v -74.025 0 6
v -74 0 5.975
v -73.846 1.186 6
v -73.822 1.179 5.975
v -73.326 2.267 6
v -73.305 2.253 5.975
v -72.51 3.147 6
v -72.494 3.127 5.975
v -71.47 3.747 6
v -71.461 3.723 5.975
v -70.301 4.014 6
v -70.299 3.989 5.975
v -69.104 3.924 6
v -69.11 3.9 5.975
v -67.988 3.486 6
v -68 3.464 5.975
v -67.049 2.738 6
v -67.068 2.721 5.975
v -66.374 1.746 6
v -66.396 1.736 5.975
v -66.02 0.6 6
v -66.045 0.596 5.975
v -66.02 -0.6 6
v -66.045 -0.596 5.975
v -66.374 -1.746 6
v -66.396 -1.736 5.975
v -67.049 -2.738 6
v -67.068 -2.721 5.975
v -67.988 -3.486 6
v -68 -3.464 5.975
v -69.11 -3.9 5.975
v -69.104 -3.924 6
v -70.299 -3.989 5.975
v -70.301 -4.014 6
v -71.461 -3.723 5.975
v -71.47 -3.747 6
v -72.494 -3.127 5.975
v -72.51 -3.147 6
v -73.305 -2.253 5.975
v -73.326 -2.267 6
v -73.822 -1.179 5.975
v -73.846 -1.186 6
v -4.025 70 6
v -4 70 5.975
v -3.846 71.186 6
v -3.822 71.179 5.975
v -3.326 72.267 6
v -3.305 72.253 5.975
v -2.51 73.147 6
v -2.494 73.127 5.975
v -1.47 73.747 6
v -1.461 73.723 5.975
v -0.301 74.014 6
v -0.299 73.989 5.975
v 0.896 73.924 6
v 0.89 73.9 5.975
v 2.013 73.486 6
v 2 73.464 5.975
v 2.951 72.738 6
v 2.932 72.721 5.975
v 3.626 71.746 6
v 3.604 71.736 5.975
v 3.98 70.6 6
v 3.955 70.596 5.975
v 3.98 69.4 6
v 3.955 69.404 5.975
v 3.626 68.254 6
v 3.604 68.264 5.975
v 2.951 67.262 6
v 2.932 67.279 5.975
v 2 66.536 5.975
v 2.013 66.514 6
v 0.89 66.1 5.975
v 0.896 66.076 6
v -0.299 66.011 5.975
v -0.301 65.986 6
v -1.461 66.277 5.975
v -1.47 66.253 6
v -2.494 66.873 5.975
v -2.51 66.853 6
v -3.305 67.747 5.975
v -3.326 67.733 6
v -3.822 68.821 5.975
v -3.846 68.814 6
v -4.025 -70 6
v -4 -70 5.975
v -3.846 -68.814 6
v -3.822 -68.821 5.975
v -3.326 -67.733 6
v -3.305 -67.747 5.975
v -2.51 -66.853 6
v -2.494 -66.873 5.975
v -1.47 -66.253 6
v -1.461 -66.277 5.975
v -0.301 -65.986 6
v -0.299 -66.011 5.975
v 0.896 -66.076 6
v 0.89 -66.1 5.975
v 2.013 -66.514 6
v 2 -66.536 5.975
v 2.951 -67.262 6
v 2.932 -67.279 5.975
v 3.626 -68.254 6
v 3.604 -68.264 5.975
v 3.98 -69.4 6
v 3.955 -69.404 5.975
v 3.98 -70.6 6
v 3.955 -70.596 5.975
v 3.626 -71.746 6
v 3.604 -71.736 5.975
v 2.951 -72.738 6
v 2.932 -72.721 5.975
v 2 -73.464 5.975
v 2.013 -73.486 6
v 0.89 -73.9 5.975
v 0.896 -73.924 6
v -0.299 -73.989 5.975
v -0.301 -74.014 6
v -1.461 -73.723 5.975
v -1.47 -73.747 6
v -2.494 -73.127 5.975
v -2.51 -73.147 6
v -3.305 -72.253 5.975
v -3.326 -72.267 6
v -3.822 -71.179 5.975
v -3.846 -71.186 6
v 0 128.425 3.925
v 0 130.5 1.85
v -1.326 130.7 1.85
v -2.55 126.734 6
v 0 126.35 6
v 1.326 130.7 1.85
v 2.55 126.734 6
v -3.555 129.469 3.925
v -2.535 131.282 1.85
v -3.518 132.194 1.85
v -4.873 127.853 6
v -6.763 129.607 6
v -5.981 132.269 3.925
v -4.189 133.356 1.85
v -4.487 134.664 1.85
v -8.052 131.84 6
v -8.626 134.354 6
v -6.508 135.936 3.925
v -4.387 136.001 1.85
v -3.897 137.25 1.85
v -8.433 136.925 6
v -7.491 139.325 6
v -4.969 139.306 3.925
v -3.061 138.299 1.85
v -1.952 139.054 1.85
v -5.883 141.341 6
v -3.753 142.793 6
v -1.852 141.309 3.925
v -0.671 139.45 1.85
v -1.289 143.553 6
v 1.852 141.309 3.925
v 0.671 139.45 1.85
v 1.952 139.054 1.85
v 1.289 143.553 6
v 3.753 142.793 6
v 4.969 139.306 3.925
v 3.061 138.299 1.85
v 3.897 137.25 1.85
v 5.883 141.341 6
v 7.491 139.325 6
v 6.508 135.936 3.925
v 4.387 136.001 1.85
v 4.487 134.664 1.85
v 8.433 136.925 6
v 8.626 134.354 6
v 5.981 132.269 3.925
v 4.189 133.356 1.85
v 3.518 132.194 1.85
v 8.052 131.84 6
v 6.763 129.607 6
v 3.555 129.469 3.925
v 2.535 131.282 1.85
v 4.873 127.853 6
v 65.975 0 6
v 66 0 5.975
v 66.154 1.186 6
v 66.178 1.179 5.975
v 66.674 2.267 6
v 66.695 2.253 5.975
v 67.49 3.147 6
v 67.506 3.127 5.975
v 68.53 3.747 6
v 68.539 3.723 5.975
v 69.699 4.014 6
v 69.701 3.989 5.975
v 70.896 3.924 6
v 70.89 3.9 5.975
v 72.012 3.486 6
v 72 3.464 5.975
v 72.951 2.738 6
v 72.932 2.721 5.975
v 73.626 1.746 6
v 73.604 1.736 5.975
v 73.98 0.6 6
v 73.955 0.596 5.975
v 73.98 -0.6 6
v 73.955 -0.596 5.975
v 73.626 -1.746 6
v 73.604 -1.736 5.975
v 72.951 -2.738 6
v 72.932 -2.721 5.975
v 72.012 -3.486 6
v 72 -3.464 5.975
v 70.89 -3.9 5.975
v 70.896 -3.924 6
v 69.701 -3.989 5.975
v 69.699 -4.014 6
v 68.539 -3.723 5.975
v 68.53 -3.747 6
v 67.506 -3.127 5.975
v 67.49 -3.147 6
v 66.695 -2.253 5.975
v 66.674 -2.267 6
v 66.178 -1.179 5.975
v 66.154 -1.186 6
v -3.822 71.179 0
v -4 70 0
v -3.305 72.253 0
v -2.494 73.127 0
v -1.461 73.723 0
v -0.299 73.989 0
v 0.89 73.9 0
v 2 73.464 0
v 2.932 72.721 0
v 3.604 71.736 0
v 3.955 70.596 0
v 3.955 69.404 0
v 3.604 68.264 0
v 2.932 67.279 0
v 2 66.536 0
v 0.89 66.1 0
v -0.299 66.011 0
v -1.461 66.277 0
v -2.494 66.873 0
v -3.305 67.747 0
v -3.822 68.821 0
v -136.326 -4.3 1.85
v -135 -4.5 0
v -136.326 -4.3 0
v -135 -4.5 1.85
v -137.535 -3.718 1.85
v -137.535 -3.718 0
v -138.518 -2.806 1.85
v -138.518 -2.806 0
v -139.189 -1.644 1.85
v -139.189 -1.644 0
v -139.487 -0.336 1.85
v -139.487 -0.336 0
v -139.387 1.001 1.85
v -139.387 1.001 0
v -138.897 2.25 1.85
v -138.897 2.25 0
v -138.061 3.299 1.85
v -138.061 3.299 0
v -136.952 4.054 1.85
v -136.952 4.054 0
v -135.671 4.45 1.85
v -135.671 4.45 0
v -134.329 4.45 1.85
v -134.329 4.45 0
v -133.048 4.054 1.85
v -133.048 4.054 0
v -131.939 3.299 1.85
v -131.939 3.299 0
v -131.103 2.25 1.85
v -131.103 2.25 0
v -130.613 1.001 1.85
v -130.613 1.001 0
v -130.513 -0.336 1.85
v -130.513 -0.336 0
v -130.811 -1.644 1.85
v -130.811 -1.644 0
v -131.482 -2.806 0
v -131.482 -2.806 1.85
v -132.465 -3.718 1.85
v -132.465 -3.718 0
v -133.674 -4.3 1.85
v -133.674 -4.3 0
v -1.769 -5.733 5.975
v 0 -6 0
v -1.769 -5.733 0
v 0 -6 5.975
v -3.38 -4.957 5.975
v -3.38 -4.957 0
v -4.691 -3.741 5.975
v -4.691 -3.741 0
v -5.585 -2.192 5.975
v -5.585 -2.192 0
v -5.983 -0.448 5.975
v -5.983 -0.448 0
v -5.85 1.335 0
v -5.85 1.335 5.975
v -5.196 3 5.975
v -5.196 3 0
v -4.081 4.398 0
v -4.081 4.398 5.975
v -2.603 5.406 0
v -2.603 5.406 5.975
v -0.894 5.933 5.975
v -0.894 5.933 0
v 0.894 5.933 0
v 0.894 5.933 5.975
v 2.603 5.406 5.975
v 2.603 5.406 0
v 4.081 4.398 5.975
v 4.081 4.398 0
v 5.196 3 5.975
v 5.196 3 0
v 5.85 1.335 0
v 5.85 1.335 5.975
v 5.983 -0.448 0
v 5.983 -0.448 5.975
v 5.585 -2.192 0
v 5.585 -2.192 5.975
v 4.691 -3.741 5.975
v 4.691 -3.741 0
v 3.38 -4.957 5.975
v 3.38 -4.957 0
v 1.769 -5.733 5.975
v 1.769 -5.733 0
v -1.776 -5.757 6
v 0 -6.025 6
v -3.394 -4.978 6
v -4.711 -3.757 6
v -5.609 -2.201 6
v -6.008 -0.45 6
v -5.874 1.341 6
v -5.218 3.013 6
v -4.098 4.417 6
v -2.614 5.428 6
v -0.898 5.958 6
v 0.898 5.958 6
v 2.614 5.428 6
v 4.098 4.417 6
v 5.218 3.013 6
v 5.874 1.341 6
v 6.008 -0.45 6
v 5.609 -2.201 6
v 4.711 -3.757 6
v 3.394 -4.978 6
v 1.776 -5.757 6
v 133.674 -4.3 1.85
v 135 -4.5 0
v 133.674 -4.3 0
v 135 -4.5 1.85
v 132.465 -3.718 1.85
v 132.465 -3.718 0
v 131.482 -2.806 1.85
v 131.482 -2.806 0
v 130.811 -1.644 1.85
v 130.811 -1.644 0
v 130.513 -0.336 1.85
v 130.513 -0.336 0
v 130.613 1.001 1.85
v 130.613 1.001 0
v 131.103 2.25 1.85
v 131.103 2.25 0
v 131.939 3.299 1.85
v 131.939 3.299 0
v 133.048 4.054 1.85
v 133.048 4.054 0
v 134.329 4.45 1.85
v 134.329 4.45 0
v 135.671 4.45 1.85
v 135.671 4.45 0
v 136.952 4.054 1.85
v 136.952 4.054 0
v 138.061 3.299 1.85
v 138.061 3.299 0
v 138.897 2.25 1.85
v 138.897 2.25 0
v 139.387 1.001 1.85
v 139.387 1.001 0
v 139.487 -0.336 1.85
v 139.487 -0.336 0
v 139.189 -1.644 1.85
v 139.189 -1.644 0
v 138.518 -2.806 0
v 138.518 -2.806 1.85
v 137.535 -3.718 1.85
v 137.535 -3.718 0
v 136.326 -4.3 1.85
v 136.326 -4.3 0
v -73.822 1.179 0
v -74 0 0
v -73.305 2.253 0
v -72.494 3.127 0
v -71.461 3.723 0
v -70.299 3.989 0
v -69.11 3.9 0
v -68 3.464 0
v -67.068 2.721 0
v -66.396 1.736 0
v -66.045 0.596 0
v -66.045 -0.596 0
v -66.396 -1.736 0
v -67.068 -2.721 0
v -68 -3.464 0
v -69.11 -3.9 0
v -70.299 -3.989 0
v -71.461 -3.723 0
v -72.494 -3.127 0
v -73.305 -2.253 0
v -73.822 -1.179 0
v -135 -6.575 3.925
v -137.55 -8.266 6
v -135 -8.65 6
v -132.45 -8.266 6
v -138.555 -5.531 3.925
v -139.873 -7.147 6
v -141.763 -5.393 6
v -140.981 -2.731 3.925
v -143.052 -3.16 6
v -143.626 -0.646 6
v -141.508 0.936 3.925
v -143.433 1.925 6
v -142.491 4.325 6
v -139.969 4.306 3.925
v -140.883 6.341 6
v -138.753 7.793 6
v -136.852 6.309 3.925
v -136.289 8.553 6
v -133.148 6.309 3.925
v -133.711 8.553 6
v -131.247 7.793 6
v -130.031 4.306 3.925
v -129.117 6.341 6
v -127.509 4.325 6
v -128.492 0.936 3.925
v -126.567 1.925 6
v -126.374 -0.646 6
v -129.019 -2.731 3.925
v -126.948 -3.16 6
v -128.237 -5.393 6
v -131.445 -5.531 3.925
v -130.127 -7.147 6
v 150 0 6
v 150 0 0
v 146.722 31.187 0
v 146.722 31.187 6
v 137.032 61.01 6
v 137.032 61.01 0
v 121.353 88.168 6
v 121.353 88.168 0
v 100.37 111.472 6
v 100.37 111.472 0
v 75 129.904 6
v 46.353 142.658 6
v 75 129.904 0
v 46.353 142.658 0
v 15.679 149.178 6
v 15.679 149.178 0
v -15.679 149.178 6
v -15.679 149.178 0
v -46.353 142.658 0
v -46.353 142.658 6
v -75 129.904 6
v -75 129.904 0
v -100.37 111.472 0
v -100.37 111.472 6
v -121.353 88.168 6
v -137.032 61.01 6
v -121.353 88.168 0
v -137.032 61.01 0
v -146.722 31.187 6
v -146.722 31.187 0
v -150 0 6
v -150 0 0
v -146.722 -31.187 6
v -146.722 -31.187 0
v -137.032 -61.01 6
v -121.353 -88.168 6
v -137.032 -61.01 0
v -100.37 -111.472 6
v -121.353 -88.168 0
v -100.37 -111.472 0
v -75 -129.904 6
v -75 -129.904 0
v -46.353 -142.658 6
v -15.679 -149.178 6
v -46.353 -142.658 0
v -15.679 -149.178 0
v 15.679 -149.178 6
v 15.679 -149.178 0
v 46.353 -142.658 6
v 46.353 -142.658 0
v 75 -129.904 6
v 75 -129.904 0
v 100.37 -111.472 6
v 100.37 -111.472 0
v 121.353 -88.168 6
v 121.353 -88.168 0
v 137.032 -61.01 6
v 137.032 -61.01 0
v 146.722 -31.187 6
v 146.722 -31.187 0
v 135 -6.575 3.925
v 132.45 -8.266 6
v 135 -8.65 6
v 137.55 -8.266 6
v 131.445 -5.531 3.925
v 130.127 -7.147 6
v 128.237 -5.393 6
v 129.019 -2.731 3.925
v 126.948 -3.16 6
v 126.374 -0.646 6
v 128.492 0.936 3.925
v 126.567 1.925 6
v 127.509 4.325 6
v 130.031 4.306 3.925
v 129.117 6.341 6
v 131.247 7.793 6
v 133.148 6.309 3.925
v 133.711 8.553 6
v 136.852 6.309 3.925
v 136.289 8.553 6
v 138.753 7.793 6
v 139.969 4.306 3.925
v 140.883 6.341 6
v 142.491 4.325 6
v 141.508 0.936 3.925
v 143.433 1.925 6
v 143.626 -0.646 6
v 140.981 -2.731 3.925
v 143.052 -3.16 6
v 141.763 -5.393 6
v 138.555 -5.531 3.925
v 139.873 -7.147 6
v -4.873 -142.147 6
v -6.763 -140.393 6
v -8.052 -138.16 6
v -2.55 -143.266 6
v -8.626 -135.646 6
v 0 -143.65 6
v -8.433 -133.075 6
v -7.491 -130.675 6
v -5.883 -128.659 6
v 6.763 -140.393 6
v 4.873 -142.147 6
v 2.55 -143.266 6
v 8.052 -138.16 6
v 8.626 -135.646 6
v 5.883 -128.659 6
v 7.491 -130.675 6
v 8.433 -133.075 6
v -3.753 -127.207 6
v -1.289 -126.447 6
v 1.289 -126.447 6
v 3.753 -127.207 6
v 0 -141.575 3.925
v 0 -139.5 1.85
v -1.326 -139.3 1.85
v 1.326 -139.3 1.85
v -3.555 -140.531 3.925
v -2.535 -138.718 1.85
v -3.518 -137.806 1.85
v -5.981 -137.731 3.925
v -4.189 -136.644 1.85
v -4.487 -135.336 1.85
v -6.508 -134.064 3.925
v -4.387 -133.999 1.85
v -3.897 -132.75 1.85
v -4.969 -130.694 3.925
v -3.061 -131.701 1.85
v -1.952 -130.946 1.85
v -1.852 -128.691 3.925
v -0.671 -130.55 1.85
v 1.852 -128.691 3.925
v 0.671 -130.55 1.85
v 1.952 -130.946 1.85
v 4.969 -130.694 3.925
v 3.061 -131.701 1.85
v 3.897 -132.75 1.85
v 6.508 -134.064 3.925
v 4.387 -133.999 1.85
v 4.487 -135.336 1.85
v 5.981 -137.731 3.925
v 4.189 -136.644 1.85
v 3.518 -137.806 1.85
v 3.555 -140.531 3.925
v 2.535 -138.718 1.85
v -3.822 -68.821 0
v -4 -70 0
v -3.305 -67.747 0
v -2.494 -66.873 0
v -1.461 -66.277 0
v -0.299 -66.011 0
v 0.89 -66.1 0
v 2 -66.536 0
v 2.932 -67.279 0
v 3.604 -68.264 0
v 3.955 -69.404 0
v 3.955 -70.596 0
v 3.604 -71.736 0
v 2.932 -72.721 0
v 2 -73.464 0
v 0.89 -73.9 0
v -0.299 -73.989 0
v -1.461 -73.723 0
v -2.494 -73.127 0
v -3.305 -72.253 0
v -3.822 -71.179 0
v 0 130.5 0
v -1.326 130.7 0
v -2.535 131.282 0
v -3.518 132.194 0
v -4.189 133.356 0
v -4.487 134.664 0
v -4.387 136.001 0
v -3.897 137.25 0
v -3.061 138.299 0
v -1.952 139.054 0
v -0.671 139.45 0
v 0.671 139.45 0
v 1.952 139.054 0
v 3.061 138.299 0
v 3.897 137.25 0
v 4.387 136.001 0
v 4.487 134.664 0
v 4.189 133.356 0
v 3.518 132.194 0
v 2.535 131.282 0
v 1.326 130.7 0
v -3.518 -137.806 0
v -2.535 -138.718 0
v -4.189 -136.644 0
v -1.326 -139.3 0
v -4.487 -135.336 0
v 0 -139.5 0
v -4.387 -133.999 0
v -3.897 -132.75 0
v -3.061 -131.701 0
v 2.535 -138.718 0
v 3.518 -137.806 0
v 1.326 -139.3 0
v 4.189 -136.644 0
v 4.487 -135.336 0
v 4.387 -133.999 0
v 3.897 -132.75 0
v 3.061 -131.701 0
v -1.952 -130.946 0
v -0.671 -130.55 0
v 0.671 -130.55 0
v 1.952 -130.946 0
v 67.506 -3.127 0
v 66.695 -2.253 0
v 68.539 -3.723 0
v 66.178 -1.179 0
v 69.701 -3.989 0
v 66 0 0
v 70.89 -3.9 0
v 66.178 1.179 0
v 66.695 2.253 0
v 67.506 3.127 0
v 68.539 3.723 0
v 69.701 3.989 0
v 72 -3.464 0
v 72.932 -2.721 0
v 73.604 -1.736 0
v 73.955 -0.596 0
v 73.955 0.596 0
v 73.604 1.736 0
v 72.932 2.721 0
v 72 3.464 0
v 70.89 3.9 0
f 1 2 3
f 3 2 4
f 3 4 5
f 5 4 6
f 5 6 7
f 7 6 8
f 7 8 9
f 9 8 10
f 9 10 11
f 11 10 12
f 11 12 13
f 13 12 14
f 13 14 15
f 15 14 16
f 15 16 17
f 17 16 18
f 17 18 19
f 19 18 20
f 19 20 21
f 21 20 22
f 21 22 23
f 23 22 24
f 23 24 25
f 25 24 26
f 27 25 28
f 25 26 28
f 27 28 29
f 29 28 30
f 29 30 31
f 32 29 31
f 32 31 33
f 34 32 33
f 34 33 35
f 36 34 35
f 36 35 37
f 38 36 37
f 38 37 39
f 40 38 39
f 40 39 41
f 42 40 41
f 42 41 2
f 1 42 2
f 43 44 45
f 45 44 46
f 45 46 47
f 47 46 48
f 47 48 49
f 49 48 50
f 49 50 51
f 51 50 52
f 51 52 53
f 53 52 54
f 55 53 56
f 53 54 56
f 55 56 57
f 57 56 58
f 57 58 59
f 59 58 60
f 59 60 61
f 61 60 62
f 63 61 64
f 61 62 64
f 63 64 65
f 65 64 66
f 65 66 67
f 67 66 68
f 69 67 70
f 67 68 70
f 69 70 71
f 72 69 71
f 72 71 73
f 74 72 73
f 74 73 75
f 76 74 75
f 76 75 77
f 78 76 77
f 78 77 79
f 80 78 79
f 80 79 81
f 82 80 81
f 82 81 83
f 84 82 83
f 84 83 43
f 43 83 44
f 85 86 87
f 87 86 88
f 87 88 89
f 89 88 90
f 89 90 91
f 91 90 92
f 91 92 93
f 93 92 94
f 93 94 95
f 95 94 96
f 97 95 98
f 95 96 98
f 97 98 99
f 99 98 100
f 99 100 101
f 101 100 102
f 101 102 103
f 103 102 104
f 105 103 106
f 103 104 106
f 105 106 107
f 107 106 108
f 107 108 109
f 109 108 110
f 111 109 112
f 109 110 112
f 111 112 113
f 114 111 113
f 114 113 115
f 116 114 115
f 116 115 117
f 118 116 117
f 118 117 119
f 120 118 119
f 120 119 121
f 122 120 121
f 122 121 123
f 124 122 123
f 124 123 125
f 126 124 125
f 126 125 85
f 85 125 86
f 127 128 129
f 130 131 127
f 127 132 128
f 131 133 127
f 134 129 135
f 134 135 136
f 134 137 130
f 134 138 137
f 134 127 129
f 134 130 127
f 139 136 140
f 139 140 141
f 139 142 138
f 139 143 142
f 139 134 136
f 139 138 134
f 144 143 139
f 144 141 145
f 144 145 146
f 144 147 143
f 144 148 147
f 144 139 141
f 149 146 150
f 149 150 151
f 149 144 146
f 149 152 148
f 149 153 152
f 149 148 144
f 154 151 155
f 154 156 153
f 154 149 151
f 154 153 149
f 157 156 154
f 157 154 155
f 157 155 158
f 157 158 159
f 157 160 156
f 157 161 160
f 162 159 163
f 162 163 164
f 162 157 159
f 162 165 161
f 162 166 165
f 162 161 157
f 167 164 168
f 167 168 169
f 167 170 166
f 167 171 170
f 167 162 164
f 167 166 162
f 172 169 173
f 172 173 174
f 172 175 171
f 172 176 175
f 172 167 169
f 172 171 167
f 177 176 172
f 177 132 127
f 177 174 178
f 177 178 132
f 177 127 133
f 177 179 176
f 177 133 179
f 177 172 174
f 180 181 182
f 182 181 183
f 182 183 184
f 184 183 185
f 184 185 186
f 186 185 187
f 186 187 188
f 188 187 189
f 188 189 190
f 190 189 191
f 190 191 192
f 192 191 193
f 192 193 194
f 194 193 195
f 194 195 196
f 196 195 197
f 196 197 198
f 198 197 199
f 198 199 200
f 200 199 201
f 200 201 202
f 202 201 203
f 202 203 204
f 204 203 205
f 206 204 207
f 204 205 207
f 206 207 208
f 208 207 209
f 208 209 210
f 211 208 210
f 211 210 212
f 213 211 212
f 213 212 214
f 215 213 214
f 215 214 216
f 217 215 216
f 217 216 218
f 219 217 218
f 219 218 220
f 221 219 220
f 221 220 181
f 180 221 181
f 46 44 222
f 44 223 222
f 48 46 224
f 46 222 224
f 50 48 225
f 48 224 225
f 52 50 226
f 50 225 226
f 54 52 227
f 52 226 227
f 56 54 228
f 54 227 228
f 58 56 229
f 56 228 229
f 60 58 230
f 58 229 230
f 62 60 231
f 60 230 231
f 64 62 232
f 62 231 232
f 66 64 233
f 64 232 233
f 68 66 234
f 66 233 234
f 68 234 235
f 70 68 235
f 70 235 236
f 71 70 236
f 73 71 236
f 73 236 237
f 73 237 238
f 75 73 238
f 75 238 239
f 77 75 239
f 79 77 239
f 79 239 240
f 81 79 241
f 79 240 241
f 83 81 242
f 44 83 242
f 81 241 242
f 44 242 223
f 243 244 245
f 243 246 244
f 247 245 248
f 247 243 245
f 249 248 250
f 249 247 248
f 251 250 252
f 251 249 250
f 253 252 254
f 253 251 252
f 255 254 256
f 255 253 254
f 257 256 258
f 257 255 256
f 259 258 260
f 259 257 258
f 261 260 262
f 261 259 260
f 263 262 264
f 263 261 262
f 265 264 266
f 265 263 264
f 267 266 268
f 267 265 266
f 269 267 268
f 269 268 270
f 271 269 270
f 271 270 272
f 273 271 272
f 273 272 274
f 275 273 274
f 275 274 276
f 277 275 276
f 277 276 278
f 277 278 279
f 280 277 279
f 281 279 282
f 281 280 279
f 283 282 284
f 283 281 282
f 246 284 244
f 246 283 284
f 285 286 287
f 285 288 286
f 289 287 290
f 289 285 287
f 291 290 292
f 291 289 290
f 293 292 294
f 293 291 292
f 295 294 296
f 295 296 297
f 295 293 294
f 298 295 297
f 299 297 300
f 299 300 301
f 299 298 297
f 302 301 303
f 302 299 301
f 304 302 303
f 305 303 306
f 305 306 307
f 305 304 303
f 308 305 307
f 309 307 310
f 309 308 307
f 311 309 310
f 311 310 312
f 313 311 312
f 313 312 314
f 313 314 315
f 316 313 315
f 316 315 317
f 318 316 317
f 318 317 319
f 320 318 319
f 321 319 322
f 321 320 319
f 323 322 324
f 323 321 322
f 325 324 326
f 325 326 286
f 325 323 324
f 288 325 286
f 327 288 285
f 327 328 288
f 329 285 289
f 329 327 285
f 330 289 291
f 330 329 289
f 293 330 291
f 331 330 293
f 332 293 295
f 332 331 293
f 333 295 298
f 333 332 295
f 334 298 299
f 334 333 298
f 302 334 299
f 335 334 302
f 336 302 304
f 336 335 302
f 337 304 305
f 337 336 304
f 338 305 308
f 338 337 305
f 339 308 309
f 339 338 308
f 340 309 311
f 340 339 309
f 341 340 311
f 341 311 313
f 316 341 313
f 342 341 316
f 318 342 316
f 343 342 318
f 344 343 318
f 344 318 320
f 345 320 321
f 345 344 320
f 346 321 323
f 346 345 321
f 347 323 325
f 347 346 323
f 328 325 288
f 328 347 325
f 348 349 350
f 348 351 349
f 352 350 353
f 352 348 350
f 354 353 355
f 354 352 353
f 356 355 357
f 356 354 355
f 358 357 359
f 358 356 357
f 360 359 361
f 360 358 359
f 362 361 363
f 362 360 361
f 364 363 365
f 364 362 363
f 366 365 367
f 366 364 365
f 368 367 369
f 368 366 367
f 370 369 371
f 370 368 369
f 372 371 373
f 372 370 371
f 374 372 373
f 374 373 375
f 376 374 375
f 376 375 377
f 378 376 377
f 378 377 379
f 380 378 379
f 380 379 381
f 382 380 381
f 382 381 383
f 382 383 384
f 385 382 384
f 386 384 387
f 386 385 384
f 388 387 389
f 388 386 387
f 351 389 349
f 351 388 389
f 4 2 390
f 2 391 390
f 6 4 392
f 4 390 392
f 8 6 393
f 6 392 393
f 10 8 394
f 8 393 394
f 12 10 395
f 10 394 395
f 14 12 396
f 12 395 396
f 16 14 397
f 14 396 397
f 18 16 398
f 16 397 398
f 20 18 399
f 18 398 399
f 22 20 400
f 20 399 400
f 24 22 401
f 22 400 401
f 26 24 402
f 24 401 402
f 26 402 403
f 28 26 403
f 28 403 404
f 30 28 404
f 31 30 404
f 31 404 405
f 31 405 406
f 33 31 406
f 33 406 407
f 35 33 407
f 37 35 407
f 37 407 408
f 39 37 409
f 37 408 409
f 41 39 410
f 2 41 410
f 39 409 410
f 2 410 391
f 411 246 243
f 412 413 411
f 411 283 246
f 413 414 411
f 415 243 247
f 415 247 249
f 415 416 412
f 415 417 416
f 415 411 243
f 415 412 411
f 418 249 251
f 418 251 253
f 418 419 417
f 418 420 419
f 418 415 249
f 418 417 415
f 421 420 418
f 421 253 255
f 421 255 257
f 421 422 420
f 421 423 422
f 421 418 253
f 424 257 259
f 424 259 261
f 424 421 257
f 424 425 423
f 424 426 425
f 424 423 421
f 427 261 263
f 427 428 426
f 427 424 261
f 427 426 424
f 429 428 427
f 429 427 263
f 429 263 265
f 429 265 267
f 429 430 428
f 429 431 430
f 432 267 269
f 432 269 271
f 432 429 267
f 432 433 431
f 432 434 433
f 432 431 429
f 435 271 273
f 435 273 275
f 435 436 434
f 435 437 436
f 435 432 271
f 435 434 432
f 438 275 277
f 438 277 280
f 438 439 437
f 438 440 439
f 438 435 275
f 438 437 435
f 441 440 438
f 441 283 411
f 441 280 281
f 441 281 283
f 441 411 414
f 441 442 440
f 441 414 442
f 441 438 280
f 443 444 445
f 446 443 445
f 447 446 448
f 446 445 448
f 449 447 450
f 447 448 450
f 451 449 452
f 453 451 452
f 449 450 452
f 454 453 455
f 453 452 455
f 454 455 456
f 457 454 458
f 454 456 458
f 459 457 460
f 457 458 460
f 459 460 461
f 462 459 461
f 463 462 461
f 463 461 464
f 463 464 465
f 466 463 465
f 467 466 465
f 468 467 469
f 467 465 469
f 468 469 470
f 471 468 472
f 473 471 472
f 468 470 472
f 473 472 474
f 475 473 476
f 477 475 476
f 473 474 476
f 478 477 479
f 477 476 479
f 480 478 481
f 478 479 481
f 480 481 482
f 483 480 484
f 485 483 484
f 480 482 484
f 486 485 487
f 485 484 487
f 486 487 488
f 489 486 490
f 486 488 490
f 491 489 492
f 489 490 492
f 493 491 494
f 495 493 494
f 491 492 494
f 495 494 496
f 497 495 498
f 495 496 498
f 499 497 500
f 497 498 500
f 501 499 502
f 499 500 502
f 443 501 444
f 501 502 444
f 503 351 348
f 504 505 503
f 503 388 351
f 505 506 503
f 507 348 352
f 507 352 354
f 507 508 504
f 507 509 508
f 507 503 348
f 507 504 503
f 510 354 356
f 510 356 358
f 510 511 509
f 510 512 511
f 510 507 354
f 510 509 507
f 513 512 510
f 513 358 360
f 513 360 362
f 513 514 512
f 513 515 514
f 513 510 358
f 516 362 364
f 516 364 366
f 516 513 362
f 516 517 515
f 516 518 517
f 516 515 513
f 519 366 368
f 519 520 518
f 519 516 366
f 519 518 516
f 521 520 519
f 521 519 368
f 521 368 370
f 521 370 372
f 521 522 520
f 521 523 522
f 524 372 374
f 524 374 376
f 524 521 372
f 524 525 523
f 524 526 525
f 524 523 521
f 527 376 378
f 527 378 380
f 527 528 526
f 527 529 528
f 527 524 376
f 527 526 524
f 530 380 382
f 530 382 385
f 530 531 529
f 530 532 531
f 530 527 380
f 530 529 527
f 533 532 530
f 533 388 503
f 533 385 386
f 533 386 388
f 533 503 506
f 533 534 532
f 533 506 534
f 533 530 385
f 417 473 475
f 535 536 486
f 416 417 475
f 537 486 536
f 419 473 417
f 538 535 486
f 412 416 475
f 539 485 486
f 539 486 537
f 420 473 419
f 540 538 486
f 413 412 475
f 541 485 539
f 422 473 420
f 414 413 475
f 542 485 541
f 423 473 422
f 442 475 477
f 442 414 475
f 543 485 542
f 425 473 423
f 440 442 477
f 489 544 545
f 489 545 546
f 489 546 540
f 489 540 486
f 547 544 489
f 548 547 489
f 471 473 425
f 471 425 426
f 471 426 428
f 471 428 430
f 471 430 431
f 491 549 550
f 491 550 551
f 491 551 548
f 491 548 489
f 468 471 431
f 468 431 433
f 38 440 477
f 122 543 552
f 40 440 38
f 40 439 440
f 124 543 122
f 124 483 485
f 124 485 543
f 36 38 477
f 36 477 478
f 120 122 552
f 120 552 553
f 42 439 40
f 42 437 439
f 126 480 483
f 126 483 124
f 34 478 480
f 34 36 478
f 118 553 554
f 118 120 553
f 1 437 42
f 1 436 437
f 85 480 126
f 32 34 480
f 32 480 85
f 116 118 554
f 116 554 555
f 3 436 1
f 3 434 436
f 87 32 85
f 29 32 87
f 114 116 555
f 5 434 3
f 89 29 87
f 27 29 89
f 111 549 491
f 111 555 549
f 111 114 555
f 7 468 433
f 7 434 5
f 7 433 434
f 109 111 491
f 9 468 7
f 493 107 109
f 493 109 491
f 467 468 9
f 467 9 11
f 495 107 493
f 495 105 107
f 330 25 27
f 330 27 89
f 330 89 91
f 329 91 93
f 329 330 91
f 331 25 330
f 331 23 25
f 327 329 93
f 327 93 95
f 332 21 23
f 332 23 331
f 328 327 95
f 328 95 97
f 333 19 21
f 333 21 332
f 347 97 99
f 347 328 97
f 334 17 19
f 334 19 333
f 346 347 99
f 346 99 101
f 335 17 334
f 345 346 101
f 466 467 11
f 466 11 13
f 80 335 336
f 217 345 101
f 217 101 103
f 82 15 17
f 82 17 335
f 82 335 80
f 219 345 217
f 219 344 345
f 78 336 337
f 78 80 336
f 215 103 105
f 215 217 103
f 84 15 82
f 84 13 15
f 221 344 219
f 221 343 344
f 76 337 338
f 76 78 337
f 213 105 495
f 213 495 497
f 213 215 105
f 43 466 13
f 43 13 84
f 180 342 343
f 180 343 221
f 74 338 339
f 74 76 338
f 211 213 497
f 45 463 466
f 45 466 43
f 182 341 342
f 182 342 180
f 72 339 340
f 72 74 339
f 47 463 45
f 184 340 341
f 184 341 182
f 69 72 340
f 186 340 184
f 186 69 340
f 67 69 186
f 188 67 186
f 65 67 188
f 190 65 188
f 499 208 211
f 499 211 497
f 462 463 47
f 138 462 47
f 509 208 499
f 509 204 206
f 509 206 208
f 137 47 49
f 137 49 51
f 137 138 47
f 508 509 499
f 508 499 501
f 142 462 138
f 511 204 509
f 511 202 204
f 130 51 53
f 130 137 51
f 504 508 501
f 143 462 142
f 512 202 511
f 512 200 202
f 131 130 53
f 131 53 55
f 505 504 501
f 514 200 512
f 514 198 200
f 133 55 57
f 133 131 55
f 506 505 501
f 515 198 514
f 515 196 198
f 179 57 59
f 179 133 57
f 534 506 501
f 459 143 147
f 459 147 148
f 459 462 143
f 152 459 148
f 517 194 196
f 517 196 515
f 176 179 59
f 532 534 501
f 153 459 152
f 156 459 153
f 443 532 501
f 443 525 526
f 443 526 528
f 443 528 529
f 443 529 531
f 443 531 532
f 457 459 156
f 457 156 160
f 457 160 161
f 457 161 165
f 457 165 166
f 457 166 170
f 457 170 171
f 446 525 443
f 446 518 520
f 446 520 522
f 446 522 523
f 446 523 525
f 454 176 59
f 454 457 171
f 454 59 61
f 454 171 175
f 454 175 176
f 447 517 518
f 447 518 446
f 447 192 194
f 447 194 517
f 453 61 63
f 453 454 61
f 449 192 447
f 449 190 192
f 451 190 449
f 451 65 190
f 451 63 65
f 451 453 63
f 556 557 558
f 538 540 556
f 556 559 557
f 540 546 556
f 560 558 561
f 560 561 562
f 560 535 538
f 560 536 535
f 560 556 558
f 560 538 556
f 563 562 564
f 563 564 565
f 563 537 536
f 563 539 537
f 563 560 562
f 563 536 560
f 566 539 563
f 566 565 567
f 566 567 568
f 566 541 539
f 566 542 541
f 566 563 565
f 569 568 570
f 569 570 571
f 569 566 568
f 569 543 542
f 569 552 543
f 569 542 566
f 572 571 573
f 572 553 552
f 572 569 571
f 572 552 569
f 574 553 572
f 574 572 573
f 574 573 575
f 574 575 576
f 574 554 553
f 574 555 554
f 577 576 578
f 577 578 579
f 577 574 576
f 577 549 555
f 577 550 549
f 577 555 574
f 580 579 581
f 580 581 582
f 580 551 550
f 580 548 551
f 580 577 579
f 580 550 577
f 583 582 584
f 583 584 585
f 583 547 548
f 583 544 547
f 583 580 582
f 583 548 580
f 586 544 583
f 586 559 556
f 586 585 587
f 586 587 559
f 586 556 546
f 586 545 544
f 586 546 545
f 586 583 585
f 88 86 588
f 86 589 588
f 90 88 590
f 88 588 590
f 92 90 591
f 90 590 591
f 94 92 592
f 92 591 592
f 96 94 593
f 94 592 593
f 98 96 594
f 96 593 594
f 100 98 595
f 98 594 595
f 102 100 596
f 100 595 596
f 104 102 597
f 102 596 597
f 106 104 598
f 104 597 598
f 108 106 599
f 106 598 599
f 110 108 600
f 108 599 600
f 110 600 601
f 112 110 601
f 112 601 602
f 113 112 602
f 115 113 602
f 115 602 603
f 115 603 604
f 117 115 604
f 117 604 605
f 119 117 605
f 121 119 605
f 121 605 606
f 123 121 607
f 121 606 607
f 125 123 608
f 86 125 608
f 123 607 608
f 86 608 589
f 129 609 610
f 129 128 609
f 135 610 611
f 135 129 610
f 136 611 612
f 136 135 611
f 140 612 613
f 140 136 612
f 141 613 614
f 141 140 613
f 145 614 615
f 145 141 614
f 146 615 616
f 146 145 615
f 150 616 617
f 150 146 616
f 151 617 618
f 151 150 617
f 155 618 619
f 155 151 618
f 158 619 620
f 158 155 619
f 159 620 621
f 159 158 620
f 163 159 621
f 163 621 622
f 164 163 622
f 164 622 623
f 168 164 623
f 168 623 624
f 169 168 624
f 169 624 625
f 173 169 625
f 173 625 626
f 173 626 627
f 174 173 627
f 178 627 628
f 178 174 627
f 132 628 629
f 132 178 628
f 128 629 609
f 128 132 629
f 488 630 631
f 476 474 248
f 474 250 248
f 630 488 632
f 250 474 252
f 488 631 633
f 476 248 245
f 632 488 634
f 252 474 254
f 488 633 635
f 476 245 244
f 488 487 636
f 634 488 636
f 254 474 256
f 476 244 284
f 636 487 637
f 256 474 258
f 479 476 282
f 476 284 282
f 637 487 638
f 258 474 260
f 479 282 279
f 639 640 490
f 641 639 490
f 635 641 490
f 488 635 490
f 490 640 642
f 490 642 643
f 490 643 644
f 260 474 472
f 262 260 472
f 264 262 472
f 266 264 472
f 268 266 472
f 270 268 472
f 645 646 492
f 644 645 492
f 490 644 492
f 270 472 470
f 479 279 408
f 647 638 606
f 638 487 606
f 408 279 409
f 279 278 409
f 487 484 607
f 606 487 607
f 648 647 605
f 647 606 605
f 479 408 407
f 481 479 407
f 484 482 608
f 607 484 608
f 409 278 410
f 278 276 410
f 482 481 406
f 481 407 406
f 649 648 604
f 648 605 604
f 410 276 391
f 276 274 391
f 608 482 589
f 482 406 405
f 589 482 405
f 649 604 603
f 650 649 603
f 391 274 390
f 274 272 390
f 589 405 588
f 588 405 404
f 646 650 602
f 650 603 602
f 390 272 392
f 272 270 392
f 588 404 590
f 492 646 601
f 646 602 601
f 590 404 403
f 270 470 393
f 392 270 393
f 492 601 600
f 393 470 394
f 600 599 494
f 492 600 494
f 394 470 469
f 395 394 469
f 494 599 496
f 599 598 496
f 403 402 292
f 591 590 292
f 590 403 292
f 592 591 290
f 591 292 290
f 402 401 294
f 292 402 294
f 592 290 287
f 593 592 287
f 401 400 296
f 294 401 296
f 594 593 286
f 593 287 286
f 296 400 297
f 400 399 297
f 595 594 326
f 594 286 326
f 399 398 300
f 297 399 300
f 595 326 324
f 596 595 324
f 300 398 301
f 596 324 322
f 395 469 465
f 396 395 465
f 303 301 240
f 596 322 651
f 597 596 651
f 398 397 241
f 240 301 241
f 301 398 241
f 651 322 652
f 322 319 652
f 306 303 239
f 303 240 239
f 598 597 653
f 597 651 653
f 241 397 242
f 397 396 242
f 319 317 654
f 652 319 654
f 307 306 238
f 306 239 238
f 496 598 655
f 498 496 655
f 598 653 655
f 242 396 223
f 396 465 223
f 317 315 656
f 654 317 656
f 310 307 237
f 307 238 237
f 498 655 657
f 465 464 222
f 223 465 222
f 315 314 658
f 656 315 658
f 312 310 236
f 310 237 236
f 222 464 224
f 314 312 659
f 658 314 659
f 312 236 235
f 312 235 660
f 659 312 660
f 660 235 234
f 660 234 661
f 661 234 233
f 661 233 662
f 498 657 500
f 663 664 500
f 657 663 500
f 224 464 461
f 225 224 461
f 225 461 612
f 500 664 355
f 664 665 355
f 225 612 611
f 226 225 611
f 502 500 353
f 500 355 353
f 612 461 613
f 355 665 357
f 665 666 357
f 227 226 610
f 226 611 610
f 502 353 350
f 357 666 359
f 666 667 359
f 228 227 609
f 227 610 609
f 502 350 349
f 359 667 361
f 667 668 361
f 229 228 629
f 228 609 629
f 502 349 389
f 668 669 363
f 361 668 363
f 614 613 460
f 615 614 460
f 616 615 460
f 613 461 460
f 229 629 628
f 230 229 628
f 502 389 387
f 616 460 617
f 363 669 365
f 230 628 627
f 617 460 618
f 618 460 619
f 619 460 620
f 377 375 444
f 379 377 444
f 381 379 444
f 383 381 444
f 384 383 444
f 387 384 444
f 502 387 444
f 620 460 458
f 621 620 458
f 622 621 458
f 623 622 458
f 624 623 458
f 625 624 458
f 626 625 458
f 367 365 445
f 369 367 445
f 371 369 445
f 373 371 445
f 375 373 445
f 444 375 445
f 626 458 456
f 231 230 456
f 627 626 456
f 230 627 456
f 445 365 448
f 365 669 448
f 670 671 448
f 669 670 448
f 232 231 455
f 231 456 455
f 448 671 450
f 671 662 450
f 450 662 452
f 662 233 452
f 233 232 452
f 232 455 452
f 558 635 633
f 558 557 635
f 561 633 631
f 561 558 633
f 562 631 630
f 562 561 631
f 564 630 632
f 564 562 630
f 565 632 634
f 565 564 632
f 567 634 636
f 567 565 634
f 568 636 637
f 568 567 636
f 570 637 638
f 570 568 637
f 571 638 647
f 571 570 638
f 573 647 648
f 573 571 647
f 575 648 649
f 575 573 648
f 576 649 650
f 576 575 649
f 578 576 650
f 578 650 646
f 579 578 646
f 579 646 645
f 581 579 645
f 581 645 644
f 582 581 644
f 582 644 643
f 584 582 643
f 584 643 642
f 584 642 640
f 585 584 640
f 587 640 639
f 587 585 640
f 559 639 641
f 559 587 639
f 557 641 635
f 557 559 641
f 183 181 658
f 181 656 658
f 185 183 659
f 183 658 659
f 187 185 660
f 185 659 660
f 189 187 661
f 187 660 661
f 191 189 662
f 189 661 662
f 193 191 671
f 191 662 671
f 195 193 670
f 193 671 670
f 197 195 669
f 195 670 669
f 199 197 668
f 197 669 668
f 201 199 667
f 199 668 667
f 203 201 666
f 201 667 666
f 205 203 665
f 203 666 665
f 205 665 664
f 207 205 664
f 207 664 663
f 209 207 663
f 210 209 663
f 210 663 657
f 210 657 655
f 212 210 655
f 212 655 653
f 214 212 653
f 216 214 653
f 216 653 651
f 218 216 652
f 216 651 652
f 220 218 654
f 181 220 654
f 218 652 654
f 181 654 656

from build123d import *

# Parameters (mm, degrees)
SZKIC1_R                                    = 150
DODANIE_WYCI_GNI_CIE1_DEPTH                 = 6
OTWORY_USTALAJ_CE_8_0MM1_D                  = 8
OTWORY_USTALAJ_CE_8_0MM1_CSINK_D            = 8.05
OTWORY_USTALAJ_CE_8_0MM1_CSINK_ANGLE        = 90
POG_BIENIE_STO_KOWE_POD_M8_WKR_T_DO_2_COUNT = 2
POG_BIENIE_STO_KOWE_POD_M8_WKR_T_DO_2_PITCH = 190.91883092
POG_BIENIE_STO_KOWE_POD_M8_WKR_T_DO_3_COUNT = 2
POG_BIENIE_STO_KOWE_POD_M8_WKR_T_DO_3_PITCH = 270
POG_BIENIE_STO_KOWE_POD_M8_WKR_T_DO_4_COUNT = 2
POG_BIENIE_STO_KOWE_POD_M8_WKR_T_DO_4_PITCH = 190.91883092


with BuildPart() as part:
    # Szkic1 → Dodanie-wyciągnięcie1 (new body)
    with BuildSketch(Plane.XY):
        Circle(SZKIC1_R)
    extrude(amount=DODANIE_WYCI_GNI_CIE1_DEPTH)

    # Otwory ustalające Ø8.0mm1 (through all)
    with Locations(Plane.XY.offset(6)):
        with Locations((0, 70), (0, -70), (-70, 0), (70, 0)):
            CounterSinkHole(OTWORY_USTALAJ_CE_8_0MM1_D / 2, OTWORY_USTALAJ_CE_8_0MM1_CSINK_D / 2, counter_sink_angle=OTWORY_USTALAJ_CE_8_0MM1_CSINK_ANGLE)

    # Szkic6 → Otwory ustalające Ø12.0mm1 (revolve, cut)
    with BuildSketch(Plane(origin=(0, 0, 6), x_dir=(0, -1, 0), z_dir=(1, 0, 0))):
        Polygon((0, 0), (0, 6), (6, 6), (6, 0.025), (6.025, 0), align=None)
    revolve(axis=Axis((0, 0, 12.35), (0, 0, -1)), mode=Mode.SUBTRACT)

    # Szkic10 → Pogłębienie stożkowe pod M8 wkręt do części metalowych z łbem soczewkowym1 (revolve, cut)
    with BuildSketch(Plane(origin=(0, 135, 6), x_dir=(0, -1, 0), z_dir=(1, 0, 0))):
        Polygon((0, 0), (0, 6), (4.5, 6), (4.5, 4.15), (8.65, 0), align=None)
    pog_bienie_sto_kowe_pod_m8_wkr_t_do_cz_c = revolve(axis=Axis((0, 135, 12.35), (0, 0, -1)), mode=Mode.SUBTRACT)

    # Pog_bienie sto_kowe pod M8 wkr_t do  2: Pogłębienie stożkowe pod M8 wkręt do części metalowych z łbem soczewkowym1 ×2
    with Locations(*[Vector(0.7071067811865674, -0.7071067811865276, 0) * (i * POG_BIENIE_STO_KOWE_POD_M8_WKR_T_DO_2_PITCH) for i in range(1, POG_BIENIE_STO_KOWE_POD_M8_WKR_T_DO_2_COUNT)]):
        add(pog_bienie_sto_kowe_pod_m8_wkr_t_do_cz_c, mode=Mode.SUBTRACT)

    # Pog_bienie sto_kowe pod M8 wkr_t do  3: Pogłębienie stożkowe pod M8 wkręt do części metalowych z łbem soczewkowym1 ×2
    with Locations(*[(0, -i * POG_BIENIE_STO_KOWE_POD_M8_WKR_T_DO_3_PITCH, 0) for i in range(1, POG_BIENIE_STO_KOWE_POD_M8_WKR_T_DO_3_COUNT)]):
        add(pog_bienie_sto_kowe_pod_m8_wkr_t_do_cz_c, mode=Mode.SUBTRACT)

    # Pog_bienie sto_kowe pod M8 wkr_t do  4: Pogłębienie stożkowe pod M8 wkręt do części metalowych z łbem soczewkowym1 ×2
    with Locations(*[Vector(-0.7071067811865277, -0.7071067811865674, 0) * (i * POG_BIENIE_STO_KOWE_POD_M8_WKR_T_DO_4_PITCH) for i in range(1, POG_BIENIE_STO_KOWE_POD_M8_WKR_T_DO_4_COUNT)]):
        add(pog_bienie_sto_kowe_pod_m8_wkr_t_do_cz_c, mode=Mode.SUBTRACT)


solid = part.part
